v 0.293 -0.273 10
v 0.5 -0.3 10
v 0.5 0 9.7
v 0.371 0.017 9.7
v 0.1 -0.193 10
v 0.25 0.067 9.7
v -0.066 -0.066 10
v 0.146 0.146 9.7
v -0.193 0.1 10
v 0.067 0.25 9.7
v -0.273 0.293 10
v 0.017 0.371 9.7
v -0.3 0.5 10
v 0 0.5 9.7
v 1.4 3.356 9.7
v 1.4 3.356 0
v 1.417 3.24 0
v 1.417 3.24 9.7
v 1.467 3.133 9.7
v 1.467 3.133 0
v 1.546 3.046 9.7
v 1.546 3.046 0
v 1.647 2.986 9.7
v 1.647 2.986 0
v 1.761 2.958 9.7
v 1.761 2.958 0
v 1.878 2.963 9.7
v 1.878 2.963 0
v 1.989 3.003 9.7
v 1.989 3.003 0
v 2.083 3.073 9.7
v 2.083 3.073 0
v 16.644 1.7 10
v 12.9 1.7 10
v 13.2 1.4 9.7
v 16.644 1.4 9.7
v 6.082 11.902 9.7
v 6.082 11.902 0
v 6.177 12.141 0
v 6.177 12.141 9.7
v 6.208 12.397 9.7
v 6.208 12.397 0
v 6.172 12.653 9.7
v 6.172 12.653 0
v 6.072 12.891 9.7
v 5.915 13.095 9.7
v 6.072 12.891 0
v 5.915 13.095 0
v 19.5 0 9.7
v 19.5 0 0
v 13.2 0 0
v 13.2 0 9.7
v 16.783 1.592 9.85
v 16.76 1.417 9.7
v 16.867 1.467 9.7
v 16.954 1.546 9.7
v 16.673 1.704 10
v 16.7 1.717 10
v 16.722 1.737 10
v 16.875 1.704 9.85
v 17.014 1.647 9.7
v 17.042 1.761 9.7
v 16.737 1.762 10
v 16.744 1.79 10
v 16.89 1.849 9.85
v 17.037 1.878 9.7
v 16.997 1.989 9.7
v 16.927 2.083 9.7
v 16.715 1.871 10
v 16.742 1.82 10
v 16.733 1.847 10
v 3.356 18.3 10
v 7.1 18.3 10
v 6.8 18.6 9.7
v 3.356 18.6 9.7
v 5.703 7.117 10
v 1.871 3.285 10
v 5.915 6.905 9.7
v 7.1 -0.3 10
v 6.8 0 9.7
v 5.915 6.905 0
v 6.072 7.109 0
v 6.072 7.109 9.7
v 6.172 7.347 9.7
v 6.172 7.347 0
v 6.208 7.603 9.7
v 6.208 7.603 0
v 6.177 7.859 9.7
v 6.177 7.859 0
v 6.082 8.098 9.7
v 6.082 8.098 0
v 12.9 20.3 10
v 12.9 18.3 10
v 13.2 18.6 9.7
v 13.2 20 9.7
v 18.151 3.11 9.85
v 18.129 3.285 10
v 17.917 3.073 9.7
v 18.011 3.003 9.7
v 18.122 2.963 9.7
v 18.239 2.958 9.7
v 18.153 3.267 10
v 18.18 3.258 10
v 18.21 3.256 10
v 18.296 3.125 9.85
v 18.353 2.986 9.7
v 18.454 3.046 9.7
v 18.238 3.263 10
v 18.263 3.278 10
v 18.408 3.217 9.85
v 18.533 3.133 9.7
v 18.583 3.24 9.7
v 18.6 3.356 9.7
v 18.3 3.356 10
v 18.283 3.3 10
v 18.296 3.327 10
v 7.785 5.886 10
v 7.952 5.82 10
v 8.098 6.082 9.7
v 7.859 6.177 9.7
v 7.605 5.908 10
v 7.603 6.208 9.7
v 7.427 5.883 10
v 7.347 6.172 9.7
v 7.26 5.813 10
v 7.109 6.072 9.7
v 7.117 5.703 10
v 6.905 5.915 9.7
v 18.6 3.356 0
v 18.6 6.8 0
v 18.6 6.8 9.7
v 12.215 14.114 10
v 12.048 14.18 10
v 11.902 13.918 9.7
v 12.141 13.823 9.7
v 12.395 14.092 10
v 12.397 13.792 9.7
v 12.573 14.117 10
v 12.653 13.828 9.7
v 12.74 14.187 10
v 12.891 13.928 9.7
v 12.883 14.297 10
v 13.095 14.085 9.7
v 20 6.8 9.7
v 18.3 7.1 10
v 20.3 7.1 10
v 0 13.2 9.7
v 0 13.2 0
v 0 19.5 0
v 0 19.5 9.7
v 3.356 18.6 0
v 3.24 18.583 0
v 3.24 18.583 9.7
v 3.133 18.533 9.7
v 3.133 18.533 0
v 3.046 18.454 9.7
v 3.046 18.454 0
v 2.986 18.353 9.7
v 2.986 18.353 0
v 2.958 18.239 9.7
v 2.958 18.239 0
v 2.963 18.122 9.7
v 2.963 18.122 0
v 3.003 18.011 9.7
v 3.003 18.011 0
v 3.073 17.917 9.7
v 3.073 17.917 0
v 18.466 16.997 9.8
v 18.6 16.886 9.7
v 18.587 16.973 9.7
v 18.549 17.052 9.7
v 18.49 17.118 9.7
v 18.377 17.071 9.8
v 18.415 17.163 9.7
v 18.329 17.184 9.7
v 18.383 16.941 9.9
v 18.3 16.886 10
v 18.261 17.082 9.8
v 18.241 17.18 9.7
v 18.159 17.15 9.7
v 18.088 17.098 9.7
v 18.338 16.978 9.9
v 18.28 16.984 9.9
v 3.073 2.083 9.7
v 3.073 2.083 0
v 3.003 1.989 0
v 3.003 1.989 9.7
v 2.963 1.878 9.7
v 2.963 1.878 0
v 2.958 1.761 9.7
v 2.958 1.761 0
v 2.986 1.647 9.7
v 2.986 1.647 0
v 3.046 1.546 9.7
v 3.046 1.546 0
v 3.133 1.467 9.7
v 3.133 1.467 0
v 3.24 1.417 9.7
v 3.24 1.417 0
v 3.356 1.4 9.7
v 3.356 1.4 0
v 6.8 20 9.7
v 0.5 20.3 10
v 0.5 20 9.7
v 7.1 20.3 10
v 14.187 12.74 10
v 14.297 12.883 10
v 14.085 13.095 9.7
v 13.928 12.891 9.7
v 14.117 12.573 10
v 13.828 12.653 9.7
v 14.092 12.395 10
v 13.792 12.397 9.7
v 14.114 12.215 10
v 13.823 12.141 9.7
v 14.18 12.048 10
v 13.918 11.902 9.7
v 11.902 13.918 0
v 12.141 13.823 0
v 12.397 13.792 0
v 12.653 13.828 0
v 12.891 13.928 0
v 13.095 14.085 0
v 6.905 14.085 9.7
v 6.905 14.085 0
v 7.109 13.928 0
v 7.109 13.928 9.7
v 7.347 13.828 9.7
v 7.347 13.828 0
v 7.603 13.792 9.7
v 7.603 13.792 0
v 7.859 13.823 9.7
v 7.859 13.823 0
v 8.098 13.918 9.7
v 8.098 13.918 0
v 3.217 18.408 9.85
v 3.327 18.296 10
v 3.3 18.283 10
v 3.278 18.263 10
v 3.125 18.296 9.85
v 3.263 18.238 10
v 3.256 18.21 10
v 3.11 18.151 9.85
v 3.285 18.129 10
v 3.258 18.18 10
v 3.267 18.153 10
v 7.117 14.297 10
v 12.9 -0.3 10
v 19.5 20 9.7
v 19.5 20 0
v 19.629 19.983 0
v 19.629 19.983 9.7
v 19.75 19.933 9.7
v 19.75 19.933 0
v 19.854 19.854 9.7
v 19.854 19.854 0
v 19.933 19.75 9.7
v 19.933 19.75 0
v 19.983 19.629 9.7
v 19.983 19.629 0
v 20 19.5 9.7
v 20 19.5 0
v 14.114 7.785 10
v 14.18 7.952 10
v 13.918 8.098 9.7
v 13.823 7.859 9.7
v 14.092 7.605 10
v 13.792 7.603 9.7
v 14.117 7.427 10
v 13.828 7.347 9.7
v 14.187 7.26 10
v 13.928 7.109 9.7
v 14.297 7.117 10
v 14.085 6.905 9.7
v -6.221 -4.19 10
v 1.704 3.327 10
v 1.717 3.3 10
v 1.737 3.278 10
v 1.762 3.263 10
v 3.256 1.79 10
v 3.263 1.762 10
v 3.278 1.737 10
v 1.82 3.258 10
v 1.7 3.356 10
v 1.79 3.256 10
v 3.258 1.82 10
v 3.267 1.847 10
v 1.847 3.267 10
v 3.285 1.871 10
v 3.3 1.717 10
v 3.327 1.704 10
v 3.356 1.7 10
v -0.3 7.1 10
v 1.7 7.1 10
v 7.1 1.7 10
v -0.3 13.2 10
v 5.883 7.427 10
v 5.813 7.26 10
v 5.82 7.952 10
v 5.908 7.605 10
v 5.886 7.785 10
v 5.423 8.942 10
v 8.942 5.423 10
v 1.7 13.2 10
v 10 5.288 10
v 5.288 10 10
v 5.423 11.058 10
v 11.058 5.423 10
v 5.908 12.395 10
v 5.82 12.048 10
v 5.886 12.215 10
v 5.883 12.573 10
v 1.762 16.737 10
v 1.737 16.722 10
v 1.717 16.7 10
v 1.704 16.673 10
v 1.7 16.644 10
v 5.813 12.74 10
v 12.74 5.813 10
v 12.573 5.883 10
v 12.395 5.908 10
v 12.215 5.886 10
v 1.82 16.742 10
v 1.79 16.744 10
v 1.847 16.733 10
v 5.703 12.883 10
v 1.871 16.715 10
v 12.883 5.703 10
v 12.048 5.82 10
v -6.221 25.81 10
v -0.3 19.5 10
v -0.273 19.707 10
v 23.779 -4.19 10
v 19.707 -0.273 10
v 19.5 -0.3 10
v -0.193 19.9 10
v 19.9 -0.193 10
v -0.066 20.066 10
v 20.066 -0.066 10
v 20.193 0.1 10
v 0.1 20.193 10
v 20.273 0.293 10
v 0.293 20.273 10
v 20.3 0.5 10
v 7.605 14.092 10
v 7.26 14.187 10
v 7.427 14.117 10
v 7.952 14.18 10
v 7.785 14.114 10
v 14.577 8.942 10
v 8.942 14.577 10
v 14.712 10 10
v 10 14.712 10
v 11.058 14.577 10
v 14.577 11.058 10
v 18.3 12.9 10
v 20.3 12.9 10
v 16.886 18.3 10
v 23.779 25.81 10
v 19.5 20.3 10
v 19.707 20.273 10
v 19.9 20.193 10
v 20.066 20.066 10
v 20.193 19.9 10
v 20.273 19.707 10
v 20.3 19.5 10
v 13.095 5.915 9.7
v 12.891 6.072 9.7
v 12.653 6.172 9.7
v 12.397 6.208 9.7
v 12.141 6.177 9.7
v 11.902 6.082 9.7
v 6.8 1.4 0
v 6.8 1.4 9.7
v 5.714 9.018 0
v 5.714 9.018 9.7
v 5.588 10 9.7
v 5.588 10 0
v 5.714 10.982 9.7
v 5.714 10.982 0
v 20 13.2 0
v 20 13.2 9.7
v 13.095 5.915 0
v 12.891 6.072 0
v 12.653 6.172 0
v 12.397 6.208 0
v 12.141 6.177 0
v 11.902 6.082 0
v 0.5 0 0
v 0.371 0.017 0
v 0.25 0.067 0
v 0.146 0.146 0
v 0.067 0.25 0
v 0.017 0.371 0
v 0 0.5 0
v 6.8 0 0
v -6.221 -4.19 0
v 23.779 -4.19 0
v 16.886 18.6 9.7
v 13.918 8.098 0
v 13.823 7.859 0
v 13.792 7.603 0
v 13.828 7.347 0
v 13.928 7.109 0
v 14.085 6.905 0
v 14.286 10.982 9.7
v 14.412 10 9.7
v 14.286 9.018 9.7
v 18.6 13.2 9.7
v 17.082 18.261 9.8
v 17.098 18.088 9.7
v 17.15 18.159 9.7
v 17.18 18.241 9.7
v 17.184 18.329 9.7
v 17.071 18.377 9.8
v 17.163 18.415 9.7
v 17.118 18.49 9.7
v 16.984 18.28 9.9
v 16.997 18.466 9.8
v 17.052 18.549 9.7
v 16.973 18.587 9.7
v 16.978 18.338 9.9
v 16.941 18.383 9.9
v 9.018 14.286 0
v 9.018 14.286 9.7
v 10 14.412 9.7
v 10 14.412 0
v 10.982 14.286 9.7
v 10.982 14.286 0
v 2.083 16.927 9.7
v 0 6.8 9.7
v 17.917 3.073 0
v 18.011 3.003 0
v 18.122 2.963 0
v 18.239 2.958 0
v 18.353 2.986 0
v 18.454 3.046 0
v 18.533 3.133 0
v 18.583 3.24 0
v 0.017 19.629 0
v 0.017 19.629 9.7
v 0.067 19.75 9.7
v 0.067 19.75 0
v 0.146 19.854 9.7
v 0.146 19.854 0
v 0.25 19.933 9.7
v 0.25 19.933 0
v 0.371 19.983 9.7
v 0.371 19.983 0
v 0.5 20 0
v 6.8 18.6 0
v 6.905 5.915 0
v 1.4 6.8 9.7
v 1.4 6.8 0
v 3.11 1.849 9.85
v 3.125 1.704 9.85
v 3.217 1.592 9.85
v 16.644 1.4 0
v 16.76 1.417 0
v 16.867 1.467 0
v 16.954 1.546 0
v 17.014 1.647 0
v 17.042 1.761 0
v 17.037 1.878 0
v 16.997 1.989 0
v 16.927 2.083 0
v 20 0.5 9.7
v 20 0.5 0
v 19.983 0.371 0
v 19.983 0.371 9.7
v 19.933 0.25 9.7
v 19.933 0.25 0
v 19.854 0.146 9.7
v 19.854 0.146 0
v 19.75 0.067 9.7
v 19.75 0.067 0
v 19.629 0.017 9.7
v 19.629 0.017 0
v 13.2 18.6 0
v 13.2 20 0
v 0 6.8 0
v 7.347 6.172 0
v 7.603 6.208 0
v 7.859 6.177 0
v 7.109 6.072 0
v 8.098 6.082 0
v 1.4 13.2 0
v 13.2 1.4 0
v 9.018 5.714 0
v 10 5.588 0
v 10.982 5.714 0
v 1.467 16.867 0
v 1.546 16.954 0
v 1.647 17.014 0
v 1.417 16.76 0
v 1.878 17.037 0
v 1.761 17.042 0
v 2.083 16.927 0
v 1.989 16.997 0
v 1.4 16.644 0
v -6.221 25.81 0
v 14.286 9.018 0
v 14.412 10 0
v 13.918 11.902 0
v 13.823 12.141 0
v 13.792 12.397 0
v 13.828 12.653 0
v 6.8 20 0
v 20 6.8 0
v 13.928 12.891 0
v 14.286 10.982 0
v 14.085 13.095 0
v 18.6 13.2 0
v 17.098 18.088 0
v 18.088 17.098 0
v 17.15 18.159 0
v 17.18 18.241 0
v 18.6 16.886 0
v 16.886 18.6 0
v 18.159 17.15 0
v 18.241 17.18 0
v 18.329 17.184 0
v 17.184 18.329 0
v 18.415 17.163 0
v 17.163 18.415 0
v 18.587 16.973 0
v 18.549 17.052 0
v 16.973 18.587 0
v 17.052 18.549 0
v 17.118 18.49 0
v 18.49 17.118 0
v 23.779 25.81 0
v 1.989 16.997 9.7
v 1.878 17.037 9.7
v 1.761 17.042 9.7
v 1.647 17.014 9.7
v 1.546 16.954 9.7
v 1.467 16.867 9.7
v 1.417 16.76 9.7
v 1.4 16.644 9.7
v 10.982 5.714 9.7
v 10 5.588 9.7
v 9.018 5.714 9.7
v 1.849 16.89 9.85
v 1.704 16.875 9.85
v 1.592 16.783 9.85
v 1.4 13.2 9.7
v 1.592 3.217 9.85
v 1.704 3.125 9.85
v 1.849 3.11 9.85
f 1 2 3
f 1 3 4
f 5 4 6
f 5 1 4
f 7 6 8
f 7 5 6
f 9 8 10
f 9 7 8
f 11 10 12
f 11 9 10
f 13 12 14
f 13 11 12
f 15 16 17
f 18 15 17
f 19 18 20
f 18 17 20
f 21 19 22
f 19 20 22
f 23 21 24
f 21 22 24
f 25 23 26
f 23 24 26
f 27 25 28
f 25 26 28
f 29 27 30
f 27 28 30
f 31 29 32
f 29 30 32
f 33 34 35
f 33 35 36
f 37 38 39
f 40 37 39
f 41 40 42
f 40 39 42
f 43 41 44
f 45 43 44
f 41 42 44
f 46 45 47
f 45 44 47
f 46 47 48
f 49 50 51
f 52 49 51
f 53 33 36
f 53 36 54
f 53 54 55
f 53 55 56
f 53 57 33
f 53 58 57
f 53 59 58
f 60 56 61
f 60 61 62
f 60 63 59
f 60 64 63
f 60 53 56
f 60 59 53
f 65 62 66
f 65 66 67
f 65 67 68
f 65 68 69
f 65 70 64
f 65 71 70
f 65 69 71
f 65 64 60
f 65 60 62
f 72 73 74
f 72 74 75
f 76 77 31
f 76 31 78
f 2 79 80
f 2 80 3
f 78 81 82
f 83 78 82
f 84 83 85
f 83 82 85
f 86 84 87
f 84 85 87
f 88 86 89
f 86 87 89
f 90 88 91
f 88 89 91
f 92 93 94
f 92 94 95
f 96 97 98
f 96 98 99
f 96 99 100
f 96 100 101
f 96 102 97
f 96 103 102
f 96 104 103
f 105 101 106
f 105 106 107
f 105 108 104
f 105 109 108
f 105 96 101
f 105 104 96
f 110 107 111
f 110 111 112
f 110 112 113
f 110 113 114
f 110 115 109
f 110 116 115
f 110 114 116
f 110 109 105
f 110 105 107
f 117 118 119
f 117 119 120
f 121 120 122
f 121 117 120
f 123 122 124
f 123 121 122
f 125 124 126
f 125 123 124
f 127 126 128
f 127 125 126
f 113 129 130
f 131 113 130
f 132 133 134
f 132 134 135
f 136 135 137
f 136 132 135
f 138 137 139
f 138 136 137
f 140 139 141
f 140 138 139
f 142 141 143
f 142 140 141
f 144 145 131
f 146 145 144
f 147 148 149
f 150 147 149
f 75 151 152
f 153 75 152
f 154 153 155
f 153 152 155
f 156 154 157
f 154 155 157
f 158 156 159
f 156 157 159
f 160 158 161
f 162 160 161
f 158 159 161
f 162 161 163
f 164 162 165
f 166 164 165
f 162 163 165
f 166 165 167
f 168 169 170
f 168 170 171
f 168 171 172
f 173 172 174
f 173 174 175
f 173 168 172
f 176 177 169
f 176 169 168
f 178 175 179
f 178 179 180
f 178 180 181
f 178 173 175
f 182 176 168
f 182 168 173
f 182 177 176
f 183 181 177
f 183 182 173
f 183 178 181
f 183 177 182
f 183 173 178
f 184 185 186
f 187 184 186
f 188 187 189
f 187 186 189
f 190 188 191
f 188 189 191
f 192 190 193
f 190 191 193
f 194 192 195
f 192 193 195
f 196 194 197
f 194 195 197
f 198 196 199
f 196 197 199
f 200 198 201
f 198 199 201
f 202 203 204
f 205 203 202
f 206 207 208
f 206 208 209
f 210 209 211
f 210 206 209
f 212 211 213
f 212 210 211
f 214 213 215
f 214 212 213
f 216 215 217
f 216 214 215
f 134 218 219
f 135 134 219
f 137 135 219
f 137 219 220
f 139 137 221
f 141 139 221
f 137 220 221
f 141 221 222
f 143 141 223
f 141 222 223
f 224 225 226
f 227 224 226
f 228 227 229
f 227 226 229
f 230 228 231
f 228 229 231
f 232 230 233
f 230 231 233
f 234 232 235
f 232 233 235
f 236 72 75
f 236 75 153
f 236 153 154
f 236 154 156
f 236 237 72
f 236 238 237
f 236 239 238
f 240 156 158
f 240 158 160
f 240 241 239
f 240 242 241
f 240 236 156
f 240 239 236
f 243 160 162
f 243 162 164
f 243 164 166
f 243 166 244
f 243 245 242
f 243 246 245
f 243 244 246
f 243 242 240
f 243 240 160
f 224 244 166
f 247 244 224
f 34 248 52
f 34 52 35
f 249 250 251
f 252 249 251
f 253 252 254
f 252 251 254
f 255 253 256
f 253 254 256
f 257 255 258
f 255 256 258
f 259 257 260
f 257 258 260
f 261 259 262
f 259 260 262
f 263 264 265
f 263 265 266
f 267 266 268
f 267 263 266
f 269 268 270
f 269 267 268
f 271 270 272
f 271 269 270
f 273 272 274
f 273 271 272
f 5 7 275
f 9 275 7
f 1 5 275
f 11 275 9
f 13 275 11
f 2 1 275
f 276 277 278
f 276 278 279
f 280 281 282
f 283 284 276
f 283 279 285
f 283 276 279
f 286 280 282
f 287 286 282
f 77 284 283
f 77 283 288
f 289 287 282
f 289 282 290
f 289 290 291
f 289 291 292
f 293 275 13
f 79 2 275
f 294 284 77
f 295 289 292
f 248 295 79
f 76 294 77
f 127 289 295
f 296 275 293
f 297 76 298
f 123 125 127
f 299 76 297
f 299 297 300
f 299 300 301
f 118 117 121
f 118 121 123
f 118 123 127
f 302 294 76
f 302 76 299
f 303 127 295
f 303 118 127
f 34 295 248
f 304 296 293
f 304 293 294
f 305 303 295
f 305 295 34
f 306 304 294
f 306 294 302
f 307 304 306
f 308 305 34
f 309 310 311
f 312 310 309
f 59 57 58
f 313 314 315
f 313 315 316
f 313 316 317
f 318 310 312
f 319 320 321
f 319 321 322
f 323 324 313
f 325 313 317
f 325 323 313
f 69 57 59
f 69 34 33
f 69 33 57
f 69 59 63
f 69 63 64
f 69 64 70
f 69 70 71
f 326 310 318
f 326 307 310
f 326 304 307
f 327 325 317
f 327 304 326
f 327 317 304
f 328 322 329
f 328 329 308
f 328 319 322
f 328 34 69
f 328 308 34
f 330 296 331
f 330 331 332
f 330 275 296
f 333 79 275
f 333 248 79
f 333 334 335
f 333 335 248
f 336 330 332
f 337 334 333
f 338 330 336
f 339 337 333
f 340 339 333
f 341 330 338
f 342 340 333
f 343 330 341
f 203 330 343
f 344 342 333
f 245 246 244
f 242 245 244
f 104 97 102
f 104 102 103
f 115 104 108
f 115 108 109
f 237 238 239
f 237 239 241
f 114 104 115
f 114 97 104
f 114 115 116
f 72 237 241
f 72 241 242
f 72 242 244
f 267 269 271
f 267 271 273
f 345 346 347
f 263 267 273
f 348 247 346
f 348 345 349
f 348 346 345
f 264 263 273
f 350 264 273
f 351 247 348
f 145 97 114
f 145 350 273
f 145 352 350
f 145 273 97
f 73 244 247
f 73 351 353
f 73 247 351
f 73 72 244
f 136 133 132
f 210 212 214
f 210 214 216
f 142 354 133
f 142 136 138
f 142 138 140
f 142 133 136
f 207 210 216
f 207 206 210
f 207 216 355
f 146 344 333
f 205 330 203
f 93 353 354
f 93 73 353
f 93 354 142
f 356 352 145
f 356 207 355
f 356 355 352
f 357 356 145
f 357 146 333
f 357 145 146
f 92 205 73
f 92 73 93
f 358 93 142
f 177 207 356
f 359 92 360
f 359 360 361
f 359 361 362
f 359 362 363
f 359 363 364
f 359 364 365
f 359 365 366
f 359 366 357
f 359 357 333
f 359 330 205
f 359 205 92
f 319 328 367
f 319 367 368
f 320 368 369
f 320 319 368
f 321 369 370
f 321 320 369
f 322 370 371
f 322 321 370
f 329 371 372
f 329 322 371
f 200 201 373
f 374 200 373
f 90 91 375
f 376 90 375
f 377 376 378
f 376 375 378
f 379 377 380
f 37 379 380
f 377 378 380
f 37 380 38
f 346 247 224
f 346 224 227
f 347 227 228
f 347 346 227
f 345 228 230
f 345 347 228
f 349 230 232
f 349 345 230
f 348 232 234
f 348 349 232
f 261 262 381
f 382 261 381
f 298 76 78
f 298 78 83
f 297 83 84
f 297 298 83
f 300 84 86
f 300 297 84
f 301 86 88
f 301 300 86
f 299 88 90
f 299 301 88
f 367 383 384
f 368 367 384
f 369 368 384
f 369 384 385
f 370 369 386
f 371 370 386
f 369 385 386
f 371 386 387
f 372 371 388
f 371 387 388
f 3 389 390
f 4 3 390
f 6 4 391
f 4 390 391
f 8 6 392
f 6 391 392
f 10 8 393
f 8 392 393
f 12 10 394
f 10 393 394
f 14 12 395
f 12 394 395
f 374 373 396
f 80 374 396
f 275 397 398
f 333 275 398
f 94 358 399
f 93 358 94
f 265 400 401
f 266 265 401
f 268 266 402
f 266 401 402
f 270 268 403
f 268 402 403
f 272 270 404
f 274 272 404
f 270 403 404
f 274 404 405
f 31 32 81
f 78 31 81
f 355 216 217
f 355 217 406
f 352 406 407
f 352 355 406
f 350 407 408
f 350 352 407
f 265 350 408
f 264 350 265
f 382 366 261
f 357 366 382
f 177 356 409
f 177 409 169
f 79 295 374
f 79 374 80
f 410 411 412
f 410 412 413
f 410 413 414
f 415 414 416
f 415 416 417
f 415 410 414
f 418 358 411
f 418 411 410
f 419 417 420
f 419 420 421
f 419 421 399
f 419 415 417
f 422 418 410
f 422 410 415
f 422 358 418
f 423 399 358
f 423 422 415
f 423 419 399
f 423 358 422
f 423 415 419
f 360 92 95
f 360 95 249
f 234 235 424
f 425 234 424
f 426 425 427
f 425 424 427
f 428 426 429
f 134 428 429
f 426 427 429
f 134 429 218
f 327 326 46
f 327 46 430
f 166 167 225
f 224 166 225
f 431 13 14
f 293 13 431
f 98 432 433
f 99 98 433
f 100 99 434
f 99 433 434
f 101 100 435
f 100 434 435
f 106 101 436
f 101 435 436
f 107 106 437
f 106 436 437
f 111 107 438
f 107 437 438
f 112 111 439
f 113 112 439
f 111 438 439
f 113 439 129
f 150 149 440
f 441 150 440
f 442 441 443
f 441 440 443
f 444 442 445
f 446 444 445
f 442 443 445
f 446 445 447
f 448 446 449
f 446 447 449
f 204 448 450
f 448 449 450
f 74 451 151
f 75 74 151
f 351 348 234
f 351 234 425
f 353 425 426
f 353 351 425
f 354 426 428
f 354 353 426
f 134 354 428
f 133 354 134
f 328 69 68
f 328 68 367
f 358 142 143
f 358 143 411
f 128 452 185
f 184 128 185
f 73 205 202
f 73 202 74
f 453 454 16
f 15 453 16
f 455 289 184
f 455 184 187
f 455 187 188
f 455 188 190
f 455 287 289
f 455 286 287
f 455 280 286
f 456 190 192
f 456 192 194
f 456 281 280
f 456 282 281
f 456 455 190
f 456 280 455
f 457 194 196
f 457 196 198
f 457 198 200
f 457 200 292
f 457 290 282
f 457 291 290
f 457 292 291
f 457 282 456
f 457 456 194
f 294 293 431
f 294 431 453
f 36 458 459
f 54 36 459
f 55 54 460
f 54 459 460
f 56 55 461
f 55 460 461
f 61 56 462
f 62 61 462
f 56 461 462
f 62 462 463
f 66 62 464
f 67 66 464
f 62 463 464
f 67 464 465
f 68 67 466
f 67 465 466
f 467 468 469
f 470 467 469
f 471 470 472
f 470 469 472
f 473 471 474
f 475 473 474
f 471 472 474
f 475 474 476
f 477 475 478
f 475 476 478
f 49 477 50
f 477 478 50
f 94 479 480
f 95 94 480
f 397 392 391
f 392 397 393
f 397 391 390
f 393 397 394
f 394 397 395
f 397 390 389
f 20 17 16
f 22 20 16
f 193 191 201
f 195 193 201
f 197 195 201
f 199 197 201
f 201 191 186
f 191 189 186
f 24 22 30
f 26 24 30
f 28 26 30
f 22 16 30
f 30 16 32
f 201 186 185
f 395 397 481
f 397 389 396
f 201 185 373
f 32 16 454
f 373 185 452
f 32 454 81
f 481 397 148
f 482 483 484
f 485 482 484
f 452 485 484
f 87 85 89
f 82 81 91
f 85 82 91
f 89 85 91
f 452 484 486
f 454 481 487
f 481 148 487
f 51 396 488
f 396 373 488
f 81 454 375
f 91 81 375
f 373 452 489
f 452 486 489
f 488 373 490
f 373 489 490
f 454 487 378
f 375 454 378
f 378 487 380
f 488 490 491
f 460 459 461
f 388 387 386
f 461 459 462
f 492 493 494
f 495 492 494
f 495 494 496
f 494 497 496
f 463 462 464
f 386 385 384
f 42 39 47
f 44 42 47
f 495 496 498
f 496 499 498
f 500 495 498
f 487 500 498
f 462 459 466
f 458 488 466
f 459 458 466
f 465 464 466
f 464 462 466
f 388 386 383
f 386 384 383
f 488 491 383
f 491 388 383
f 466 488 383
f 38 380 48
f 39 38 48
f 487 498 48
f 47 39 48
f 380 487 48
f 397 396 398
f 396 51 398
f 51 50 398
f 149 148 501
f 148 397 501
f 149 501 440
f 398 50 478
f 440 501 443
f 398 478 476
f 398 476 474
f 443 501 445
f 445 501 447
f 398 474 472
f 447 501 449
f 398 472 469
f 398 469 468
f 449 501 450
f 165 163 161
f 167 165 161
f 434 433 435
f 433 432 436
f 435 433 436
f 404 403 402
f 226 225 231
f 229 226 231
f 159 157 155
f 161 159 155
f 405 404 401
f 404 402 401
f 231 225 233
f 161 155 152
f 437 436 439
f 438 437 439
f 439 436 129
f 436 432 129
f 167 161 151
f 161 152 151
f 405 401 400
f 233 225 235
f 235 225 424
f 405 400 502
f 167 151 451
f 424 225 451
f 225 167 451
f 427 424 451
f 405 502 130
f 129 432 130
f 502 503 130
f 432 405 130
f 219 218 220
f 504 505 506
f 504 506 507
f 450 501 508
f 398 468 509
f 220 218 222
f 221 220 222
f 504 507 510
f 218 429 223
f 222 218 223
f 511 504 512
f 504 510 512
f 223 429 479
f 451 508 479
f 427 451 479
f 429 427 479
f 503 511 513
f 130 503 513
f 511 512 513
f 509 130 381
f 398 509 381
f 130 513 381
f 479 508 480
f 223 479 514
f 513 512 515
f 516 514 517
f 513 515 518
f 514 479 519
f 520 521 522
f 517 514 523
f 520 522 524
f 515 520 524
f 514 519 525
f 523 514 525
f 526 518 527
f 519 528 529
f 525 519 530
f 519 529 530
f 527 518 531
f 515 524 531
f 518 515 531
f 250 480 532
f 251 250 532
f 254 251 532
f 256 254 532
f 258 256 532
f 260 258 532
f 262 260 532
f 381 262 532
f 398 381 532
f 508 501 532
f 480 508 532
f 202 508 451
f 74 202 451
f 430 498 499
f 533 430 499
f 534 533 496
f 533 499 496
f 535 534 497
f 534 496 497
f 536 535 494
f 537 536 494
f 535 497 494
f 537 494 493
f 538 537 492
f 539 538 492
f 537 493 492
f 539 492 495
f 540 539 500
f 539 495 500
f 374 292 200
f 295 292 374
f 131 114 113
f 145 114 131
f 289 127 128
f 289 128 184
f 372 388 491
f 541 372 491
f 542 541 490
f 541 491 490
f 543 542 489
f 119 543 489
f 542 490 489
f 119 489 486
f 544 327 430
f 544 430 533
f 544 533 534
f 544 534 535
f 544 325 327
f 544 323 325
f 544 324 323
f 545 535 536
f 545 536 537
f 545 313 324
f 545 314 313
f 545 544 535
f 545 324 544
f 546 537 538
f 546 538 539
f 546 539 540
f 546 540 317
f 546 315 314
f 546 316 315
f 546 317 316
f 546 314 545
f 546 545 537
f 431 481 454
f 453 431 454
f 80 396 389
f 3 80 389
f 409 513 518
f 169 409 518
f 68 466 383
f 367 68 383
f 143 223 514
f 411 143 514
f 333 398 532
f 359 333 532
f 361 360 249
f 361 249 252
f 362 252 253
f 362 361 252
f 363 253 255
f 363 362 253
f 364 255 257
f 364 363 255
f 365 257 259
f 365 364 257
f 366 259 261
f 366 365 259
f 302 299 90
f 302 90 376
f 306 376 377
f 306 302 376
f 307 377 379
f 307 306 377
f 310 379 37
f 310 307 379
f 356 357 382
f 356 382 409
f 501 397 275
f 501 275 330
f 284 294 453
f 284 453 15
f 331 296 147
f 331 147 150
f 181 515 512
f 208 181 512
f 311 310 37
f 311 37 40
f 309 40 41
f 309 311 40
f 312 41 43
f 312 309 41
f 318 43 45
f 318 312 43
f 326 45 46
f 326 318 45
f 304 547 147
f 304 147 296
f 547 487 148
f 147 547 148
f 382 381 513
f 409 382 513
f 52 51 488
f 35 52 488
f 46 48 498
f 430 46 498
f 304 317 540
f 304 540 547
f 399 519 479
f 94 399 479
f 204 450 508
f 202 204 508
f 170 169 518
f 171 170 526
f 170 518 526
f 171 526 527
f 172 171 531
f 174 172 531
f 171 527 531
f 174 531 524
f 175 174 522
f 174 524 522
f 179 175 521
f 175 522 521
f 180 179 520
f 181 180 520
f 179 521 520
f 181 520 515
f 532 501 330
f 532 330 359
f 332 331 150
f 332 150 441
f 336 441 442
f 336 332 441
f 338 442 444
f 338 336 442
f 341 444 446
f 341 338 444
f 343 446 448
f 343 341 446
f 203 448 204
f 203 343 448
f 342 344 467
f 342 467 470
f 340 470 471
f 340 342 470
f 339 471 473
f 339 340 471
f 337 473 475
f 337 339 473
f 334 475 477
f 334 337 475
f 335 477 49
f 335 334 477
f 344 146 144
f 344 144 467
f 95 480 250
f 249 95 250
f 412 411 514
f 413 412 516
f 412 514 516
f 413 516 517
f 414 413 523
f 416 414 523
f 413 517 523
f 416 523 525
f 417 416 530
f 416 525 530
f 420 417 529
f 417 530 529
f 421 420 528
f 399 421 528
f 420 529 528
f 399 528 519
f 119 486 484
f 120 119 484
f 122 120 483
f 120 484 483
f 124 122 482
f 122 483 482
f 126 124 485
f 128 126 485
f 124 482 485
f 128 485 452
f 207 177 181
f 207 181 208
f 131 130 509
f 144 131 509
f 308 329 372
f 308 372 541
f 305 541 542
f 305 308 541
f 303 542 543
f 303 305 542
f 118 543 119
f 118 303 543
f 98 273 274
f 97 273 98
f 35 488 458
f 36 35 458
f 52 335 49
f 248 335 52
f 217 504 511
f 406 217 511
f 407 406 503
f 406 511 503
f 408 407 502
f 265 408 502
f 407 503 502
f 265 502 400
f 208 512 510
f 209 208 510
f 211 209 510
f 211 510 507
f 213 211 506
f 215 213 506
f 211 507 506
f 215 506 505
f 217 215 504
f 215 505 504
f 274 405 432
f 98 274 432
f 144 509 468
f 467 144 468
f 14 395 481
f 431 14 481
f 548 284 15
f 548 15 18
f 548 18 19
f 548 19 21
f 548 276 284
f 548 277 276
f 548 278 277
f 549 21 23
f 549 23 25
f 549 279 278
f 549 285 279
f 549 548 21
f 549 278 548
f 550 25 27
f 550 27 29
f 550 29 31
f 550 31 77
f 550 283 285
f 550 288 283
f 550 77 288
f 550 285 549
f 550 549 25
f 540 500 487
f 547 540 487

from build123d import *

# Parameters (mm, degrees)
F0_W     = 30
F0_H     = 30
F1_DEPTH = 10
F2_SIZE  = 0.29999


# Not quite as in the source:
# - a fillet or chamfer is up to 0.001 mm smaller than in the source, because OpenCascade refuses the exact size


with BuildPart() as f1:
    # F0 (on Top) → F1 (new body)
    with BuildSketch(Plane.XY):
        with Locations((8.7794362941, 10.8101805312)):
            Rectangle(F0_W, F0_H)
        with BuildLine():
            Line((13.2, 20), (19.5, 20))
            ThreePointArc((19.5, 20), (19.8535533906, 19.8535533906), (20, 19.5))
            Line((20, 19.5), (20, 13.2))
            Line((20, 13.2), (18.6, 13.2))
            Line((18.6, 13.2), (18.6, 16.8857864376))
            ThreePointArc((18.6, 16.8857864376), (18.4148050297, 17.1629502974), (18.0878679656, 17.097918472))
            Line((18.0878679656, 17.097918472), (14.0849274668, 13.0949779732))
            ThreePointArc((14.0849274668, 13.0949779732), (13.8016579584, 12.5262720767), (13.918171677, 11.9016981704))
            ThreePointArc((13.918171677, 11.9016981704), (14.4115666356, 10), (13.918171677, 8.0983018296))
            ThreePointArc((13.918171677, 8.0983018296), (13.8016579584, 7.4737279233), (14.0849274668, 6.9050220268))
            Line((14.0849274668, 6.9050220268), (17.9171572875, 3.0727922061))
            ThreePointArc((17.9171572875, 3.0727922061), (18.3530733729, 2.9860831056), (18.6, 3.3556349186))
            Line((18.6, 3.3556349186), (18.6, 6.8))
            Line((18.6, 6.8), (20, 6.8))
            Line((20, 6.8), (20, 0.5))
            ThreePointArc((20, 0.5), (19.8535533906, 0.1464466094), (19.5, 0))
            Line((19.5, 0), (13.2, 0))
            Line((13.2, 0), (13.2, 1.4))
            Line((13.2, 1.4), (16.6443650814, 1.4))
            ThreePointArc((16.6443650814, 1.4), (17.0139168944, 1.6469266271), (16.9272077939, 2.0828427125))
            Line((16.9272077939, 2.0828427125), (13.0949779732, 5.9150725332))
            ThreePointArc((13.0949779732, 5.9150725332), (12.5262720767, 6.1983420416), (11.9016981704, 6.081828323))
            ThreePointArc((11.9016981704, 6.081828323), (10, 5.5884333644), (8.0983018296, 6.081828323))
            ThreePointArc((8.0983018296, 6.081828323), (7.4737279233, 6.1983420416), (6.9050220268, 5.9150725332))
            Line((6.9050220268, 5.9150725332), (3.0727922061, 2.0828427125))
            ThreePointArc((3.0727922061, 2.0828427125), (2.9860831056, 1.6469266271), (3.3556349186, 1.4))
            Line((3.3556349186, 1.4), (6.8, 1.4))
            Line((6.8, 1.4), (6.8, 0))
            Line((6.8, 0), (0.5, 0))
            ThreePointArc((0.5, 0), (0.1464466094, 0.1464466094), (0, 0.5))
            Line((0, 0.5), (0, 6.8))
            Line((0, 6.8), (1.4, 6.8))
            Line((1.4, 6.8), (1.4, 3.3556349186))
            ThreePointArc((1.4, 3.3556349186), (1.6469266271, 2.9860831056), (2.0828427125, 3.0727922061))
            Line((2.0828427125, 3.0727922061), (5.9150725332, 6.9050220268))
            ThreePointArc((5.9150725332, 6.9050220268), (6.1983420416, 7.4737279233), (6.081828323, 8.0983018296))
            ThreePointArc((6.081828323, 8.0983018296), (5.5884333644, 10), (6.081828323, 11.9016981704))
            ThreePointArc((6.081828323, 11.9016981704), (6.1983420416, 12.5262720767), (5.9150725332, 13.0949779732))
            Line((5.9150725332, 13.0949779732), (2.0828427125, 16.9272077939))
            ThreePointArc((2.0828427125, 16.9272077939), (1.6469266271, 17.0139168944), (1.4, 16.6443650814))
            Line((1.4, 16.6443650814), (1.4, 13.2))
            Line((1.4, 13.2), (0, 13.2))
            Line((0, 13.2), (0, 19.5))
            ThreePointArc((0, 19.5), (0.1464466094, 19.8535533906), (0.5, 20))
            Line((0.5, 20), (6.8, 20))
            Line((6.8, 20), (6.8, 18.6))
            Line((6.8, 18.6), (3.3556349186, 18.6))
            ThreePointArc((3.3556349186, 18.6), (2.9860831056, 18.3530733729), (3.0727922061, 17.9171572875))
            Line((3.0727922061, 17.9171572875), (6.9050220268, 14.0849274668))
            ThreePointArc((6.9050220268, 14.0849274668), (7.4737279233, 13.8016579584), (8.0983018296, 13.918171677))
            ThreePointArc((8.0983018296, 13.918171677), (10, 14.4115666356), (11.9016981704, 13.918171677))
            ThreePointArc((11.9016981704, 13.918171677), (12.5262720767, 13.8016579584), (13.0949779732, 14.0849274668))
            Line((13.0949779732, 14.0849274668), (17.097918472, 18.0878679656))
            ThreePointArc((17.097918472, 18.0878679656), (17.1629502974, 18.4148050297), (16.8857864376, 18.6))
            Line((16.8857864376, 18.6), (13.2, 18.6))
            Line((13.2, 18.6), (13.2, 20))
        make_face(mode=Mode.SUBTRACT)
    extrude(amount=F1_DEPTH)

    # F2 (size 0.3 in the source; OpenCascade refuses exactly that, so slightly less here)
    f2_edges = [f1.edges().sort_by_distance(p)[0] for p in [
        (0, 16.35, 10),
        (4.988907, 16.001042, 10),
        (3.998958, 15.011093, 10),
        (7.473728, 6.198342, 10),
        (14.411567, 10, 10),
        (19.3, 13.2, 10),
        (16.35, 20, 10),
        (13.2, 19.3, 10),
        (6.8, 19.3, 10),
        (20, 3.65, 10),
        (13.2, 0.7, 10),
        (6.8, 0.7, 10),
        (0.7, 6.8, 10),
        (19.3, 6.8, 10),
        (0, 3.65, 10),
    ]]
    chamfer(f2_edges, length=F2_SIZE)


solid = f1.part
